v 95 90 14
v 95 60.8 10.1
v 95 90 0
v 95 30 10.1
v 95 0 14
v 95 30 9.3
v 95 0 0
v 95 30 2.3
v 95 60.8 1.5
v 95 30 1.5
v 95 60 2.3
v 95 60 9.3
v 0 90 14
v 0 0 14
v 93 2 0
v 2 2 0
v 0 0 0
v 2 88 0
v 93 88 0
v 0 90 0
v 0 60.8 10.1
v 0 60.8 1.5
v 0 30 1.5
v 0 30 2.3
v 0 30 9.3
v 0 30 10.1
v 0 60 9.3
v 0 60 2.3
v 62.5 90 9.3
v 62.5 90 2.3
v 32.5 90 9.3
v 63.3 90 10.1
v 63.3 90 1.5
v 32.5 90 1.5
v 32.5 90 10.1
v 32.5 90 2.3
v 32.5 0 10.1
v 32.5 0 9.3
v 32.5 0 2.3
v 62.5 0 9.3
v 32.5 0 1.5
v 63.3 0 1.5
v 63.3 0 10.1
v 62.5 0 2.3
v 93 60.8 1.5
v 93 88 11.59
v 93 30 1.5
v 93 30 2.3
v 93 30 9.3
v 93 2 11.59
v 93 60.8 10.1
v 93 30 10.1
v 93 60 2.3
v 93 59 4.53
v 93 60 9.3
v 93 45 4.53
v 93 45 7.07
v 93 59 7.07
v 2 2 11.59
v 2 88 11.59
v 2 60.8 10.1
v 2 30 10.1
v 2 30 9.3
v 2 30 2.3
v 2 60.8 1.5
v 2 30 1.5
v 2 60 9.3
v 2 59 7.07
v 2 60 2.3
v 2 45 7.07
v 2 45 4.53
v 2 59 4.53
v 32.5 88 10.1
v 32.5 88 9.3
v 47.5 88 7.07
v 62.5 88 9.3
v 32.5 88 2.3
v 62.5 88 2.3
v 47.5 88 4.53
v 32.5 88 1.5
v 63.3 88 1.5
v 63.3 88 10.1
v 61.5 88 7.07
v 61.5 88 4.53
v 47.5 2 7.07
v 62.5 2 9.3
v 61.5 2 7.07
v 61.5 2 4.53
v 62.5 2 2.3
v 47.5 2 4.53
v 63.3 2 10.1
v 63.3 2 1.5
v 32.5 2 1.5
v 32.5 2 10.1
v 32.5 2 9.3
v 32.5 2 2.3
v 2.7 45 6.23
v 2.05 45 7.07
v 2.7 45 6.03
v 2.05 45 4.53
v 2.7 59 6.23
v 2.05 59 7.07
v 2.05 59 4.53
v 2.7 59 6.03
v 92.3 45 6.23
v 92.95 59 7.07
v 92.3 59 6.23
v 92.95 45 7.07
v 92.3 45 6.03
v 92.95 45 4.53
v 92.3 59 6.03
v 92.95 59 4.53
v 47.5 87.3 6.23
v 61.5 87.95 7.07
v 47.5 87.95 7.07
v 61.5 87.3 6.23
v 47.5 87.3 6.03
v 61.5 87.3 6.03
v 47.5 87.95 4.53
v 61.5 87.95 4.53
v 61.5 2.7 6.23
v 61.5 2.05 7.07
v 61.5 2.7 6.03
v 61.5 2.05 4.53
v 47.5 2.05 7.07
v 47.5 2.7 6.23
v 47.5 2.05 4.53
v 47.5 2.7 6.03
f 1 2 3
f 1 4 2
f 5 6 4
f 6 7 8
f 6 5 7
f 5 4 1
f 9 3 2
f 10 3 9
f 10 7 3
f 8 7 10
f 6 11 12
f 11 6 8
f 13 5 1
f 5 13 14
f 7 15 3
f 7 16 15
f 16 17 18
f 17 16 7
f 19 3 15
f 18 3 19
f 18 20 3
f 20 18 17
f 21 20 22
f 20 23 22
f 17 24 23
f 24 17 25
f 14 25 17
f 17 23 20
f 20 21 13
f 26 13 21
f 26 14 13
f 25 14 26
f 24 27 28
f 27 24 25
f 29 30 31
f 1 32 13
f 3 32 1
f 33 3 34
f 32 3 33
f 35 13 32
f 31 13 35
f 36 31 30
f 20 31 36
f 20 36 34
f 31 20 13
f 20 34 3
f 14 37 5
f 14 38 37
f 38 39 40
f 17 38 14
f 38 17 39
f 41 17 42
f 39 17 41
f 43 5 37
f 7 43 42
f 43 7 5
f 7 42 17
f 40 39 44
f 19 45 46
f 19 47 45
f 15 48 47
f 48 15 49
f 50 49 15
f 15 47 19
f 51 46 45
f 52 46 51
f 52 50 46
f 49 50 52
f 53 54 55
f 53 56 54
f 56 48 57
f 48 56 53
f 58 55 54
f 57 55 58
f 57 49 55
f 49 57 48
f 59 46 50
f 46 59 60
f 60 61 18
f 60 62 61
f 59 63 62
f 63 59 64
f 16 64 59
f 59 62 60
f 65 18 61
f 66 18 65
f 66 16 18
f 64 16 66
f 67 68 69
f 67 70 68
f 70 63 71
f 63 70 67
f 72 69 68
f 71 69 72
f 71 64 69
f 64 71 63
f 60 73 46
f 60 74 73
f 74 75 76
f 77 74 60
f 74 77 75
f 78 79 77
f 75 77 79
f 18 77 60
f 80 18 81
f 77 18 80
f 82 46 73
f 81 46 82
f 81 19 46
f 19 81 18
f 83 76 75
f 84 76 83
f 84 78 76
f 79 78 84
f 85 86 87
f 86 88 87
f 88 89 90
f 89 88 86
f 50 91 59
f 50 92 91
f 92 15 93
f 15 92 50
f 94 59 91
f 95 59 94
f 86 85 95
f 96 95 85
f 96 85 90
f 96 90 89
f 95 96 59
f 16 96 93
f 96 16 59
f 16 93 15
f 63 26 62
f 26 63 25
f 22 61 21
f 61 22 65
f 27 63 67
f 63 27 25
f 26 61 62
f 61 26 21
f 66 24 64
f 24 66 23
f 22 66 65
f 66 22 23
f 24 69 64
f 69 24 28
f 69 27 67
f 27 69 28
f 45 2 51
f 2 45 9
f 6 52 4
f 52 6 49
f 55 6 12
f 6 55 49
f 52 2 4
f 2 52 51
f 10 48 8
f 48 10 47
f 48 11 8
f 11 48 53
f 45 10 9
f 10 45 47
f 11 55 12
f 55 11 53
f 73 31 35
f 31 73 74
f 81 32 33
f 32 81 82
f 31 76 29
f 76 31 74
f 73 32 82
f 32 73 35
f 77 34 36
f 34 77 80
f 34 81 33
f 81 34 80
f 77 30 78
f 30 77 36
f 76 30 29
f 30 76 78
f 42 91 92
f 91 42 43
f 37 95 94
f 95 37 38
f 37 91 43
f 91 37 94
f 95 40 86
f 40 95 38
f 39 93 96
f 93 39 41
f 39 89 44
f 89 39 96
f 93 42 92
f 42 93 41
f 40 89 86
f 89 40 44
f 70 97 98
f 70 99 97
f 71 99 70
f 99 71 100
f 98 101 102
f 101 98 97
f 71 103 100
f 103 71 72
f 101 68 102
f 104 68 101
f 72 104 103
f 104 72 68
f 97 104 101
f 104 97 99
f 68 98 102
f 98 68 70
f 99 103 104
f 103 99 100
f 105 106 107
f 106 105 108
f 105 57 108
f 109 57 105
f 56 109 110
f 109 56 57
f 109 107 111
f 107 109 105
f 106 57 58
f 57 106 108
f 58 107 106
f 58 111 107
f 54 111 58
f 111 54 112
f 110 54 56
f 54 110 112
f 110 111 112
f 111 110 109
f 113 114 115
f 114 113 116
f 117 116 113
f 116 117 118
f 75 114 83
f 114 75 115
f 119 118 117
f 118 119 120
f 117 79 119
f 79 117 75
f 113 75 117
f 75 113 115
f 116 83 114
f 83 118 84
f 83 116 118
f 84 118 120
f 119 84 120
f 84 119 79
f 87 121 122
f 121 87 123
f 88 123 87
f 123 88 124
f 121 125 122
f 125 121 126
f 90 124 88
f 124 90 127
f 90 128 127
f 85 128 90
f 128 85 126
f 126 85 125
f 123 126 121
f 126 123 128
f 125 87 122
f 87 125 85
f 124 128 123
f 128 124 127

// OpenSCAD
/*Code Generated using OSCADSharp on 10/08/2026 07:41:00. 

For more information, please visit https://github.com/Exolun/OSCADSharp */

module render()
{
    union()
    {
        difference()
        {
            cube(size = [95.00, 90.00, 14.00], center = false); 
            translate(v = [2.00, 2.00, -0.01])
            {
                cube(size = [91.00, 86.00, 11.60], center = false); 
            }
            translate(v = [2.00, 60.80, 0.00])
            {
                rotate([90.00, 0.00, 0.00])
                {
                    translate(v = [-2.05, 9.30, 0.00])
                    {
                        cube(size = [2.10, 0.80, 30.80], center = false); 
                    }
                }
            }
            translate(v = [2.00, 60.80, 0.00])
            {
                rotate([90.00, 0.00, 0.00])
                {
                    translate(v = [-2.05, 1.50, 0.00])
                    {
                        cube(size = [2.10, 0.80, 30.80], center = false); 
                    }
                }
            }
            translate(v = [2.00, 60.80, 0.00])
            {
                rotate([90.00, 0.00, 0.00])
                {
                    translate(v = [-2.05, 1.50, 0.00])
                    {
                        cube(size = [2.10, 8.60, 0.80], center = false); 
                    }
                }
            }
            translate(v = [93.00, 30.00, 0.00])
            {
                rotate([90.00, 0.00, 180.00])
                {
                    translate(v = [-2.05, 9.30, 0.00])
                    {
                        cube(size = [2.10, 0.80, 30.80], center = false); 
                    }
                }
            }
            translate(v = [93.00, 30.00, 0.00])
            {
                rotate([90.00, 0.00, 180.00])
                {
                    translate(v = [-2.05, 1.50, 0.00])
                    {
                        cube(size = [2.10, 0.80, 30.80], center = false); 
                    }
                }
            }
            translate(v = [93.00, 60.00, 0.00])
            {
                rotate([90.00, 0.00, 180.00])
                {
                    translate(v = [-2.05, 1.50, 0.00])
                    {
                        cube(size = [2.10, 8.60, 0.80], center = false); 
                    }
                }
            }
            translate(v = [63.30, 88.00, 0.00])
            {
                rotate([90.00, 0.00, -90.00])
                {
                    translate(v = [-2.05, 9.30, 0.00])
                    {
                        cube(size = [2.10, 0.80, 30.80], center = false); 
                    }
                }
            }
            translate(v = [63.30, 88.00, 0.00])
            {
                rotate([90.00, 0.00, -90.00])
                {
                    translate(v = [-2.05, 1.50, 0.00])
                    {
                        cube(size = [2.10, 0.80, 30.80], center = false); 
                    }
                }
            }
            translate(v = [63.30, 88.00, 0.00])
            {
                rotate([90.00, 0.00, -90.00])
                {
                    translate(v = [-2.05, 1.50, 0.00])
                    {
                        cube(size = [2.10, 8.60, 0.80], center = false); 
                    }
                }
            }
            translate(v = [32.50, 2.00, 0.00])
            {
                rotate([90.00, 0.00, 90.00])
                {
                    translate(v = [-2.05, 9.30, 0.00])
                    {
                        cube(size = [2.10, 0.80, 30.80], center = false); 
                    }
                }
            }
            translate(v = [32.50, 2.00, 0.00])
            {
                rotate([90.00, 0.00, 90.00])
                {
                    translate(v = [-2.05, 1.50, 0.00])
                    {
                        cube(size = [2.10, 0.80, 30.80], center = false); 
                    }
                }
            }
            translate(v = [62.50, 2.00, 0.00])
            {
                rotate([90.00, 0.00, 90.00])
                {
                    translate(v = [-2.05, 1.50, 0.00])
                    {
                        cube(size = [2.10, 8.60, 0.80], center = false); 
                    }
                }
            }
        }
        translate(v = [2.00, 59.00, 0.00])
        {
            rotate([90.00, 0.00, 0.00])
            {
                hull()
                {
                    translate(v = [0.00, 4.53, 0.00])
                    {
                        cube(size = [0.05, 2.54, 14.00], center = false); 
                    }
                    translate(v = [0.65, 6.03, 0.00])
                    {
                        cube(size = [0.05, 0.20, 14.00], center = false); 
                    }
                }
            }
        }
        translate(v = [93.00, 45.00, 0.00])
        {
            rotate([90.00, 0.00, 180.00])
            {
                hull()
                {
                    translate(v = [0.00, 4.53, 0.00])
                    {
                        cube(size = [0.05, 2.54, 14.00], center = false); 
                    }
                    translate(v = [0.65, 6.03, 0.00])
                    {
                        cube(size = [0.05, 0.20, 14.00], center = false); 
                    }
                }
            }
        }
        translate(v = [61.50, 88.00, 0.00])
        {
            rotate([90.00, 0.00, -90.00])
            {
                hull()
                {
                    translate(v = [0.00, 4.53, 0.00])
                    {
                        cube(size = [0.05, 2.54, 14.00], center = false); 
                    }
                    translate(v = [0.65, 6.03, 0.00])
                    {
                        cube(size = [0.05, 0.20, 14.00], center = false); 
                    }
                }
            }
        }
        translate(v = [47.50, 2.00, 0.00])
        {
            rotate([90.00, 0.00, 90.00])
            {
                hull()
                {
                    translate(v = [0.00, 4.53, 0.00])
                    {
                        cube(size = [0.05, 2.54, 14.00], center = false); 
                    }
                    translate(v = [0.65, 6.03, 0.00])
                    {
                        cube(size = [0.05, 0.20, 14.00], center = false); 
                    }
                }
            }
        }
    }
}

render();
